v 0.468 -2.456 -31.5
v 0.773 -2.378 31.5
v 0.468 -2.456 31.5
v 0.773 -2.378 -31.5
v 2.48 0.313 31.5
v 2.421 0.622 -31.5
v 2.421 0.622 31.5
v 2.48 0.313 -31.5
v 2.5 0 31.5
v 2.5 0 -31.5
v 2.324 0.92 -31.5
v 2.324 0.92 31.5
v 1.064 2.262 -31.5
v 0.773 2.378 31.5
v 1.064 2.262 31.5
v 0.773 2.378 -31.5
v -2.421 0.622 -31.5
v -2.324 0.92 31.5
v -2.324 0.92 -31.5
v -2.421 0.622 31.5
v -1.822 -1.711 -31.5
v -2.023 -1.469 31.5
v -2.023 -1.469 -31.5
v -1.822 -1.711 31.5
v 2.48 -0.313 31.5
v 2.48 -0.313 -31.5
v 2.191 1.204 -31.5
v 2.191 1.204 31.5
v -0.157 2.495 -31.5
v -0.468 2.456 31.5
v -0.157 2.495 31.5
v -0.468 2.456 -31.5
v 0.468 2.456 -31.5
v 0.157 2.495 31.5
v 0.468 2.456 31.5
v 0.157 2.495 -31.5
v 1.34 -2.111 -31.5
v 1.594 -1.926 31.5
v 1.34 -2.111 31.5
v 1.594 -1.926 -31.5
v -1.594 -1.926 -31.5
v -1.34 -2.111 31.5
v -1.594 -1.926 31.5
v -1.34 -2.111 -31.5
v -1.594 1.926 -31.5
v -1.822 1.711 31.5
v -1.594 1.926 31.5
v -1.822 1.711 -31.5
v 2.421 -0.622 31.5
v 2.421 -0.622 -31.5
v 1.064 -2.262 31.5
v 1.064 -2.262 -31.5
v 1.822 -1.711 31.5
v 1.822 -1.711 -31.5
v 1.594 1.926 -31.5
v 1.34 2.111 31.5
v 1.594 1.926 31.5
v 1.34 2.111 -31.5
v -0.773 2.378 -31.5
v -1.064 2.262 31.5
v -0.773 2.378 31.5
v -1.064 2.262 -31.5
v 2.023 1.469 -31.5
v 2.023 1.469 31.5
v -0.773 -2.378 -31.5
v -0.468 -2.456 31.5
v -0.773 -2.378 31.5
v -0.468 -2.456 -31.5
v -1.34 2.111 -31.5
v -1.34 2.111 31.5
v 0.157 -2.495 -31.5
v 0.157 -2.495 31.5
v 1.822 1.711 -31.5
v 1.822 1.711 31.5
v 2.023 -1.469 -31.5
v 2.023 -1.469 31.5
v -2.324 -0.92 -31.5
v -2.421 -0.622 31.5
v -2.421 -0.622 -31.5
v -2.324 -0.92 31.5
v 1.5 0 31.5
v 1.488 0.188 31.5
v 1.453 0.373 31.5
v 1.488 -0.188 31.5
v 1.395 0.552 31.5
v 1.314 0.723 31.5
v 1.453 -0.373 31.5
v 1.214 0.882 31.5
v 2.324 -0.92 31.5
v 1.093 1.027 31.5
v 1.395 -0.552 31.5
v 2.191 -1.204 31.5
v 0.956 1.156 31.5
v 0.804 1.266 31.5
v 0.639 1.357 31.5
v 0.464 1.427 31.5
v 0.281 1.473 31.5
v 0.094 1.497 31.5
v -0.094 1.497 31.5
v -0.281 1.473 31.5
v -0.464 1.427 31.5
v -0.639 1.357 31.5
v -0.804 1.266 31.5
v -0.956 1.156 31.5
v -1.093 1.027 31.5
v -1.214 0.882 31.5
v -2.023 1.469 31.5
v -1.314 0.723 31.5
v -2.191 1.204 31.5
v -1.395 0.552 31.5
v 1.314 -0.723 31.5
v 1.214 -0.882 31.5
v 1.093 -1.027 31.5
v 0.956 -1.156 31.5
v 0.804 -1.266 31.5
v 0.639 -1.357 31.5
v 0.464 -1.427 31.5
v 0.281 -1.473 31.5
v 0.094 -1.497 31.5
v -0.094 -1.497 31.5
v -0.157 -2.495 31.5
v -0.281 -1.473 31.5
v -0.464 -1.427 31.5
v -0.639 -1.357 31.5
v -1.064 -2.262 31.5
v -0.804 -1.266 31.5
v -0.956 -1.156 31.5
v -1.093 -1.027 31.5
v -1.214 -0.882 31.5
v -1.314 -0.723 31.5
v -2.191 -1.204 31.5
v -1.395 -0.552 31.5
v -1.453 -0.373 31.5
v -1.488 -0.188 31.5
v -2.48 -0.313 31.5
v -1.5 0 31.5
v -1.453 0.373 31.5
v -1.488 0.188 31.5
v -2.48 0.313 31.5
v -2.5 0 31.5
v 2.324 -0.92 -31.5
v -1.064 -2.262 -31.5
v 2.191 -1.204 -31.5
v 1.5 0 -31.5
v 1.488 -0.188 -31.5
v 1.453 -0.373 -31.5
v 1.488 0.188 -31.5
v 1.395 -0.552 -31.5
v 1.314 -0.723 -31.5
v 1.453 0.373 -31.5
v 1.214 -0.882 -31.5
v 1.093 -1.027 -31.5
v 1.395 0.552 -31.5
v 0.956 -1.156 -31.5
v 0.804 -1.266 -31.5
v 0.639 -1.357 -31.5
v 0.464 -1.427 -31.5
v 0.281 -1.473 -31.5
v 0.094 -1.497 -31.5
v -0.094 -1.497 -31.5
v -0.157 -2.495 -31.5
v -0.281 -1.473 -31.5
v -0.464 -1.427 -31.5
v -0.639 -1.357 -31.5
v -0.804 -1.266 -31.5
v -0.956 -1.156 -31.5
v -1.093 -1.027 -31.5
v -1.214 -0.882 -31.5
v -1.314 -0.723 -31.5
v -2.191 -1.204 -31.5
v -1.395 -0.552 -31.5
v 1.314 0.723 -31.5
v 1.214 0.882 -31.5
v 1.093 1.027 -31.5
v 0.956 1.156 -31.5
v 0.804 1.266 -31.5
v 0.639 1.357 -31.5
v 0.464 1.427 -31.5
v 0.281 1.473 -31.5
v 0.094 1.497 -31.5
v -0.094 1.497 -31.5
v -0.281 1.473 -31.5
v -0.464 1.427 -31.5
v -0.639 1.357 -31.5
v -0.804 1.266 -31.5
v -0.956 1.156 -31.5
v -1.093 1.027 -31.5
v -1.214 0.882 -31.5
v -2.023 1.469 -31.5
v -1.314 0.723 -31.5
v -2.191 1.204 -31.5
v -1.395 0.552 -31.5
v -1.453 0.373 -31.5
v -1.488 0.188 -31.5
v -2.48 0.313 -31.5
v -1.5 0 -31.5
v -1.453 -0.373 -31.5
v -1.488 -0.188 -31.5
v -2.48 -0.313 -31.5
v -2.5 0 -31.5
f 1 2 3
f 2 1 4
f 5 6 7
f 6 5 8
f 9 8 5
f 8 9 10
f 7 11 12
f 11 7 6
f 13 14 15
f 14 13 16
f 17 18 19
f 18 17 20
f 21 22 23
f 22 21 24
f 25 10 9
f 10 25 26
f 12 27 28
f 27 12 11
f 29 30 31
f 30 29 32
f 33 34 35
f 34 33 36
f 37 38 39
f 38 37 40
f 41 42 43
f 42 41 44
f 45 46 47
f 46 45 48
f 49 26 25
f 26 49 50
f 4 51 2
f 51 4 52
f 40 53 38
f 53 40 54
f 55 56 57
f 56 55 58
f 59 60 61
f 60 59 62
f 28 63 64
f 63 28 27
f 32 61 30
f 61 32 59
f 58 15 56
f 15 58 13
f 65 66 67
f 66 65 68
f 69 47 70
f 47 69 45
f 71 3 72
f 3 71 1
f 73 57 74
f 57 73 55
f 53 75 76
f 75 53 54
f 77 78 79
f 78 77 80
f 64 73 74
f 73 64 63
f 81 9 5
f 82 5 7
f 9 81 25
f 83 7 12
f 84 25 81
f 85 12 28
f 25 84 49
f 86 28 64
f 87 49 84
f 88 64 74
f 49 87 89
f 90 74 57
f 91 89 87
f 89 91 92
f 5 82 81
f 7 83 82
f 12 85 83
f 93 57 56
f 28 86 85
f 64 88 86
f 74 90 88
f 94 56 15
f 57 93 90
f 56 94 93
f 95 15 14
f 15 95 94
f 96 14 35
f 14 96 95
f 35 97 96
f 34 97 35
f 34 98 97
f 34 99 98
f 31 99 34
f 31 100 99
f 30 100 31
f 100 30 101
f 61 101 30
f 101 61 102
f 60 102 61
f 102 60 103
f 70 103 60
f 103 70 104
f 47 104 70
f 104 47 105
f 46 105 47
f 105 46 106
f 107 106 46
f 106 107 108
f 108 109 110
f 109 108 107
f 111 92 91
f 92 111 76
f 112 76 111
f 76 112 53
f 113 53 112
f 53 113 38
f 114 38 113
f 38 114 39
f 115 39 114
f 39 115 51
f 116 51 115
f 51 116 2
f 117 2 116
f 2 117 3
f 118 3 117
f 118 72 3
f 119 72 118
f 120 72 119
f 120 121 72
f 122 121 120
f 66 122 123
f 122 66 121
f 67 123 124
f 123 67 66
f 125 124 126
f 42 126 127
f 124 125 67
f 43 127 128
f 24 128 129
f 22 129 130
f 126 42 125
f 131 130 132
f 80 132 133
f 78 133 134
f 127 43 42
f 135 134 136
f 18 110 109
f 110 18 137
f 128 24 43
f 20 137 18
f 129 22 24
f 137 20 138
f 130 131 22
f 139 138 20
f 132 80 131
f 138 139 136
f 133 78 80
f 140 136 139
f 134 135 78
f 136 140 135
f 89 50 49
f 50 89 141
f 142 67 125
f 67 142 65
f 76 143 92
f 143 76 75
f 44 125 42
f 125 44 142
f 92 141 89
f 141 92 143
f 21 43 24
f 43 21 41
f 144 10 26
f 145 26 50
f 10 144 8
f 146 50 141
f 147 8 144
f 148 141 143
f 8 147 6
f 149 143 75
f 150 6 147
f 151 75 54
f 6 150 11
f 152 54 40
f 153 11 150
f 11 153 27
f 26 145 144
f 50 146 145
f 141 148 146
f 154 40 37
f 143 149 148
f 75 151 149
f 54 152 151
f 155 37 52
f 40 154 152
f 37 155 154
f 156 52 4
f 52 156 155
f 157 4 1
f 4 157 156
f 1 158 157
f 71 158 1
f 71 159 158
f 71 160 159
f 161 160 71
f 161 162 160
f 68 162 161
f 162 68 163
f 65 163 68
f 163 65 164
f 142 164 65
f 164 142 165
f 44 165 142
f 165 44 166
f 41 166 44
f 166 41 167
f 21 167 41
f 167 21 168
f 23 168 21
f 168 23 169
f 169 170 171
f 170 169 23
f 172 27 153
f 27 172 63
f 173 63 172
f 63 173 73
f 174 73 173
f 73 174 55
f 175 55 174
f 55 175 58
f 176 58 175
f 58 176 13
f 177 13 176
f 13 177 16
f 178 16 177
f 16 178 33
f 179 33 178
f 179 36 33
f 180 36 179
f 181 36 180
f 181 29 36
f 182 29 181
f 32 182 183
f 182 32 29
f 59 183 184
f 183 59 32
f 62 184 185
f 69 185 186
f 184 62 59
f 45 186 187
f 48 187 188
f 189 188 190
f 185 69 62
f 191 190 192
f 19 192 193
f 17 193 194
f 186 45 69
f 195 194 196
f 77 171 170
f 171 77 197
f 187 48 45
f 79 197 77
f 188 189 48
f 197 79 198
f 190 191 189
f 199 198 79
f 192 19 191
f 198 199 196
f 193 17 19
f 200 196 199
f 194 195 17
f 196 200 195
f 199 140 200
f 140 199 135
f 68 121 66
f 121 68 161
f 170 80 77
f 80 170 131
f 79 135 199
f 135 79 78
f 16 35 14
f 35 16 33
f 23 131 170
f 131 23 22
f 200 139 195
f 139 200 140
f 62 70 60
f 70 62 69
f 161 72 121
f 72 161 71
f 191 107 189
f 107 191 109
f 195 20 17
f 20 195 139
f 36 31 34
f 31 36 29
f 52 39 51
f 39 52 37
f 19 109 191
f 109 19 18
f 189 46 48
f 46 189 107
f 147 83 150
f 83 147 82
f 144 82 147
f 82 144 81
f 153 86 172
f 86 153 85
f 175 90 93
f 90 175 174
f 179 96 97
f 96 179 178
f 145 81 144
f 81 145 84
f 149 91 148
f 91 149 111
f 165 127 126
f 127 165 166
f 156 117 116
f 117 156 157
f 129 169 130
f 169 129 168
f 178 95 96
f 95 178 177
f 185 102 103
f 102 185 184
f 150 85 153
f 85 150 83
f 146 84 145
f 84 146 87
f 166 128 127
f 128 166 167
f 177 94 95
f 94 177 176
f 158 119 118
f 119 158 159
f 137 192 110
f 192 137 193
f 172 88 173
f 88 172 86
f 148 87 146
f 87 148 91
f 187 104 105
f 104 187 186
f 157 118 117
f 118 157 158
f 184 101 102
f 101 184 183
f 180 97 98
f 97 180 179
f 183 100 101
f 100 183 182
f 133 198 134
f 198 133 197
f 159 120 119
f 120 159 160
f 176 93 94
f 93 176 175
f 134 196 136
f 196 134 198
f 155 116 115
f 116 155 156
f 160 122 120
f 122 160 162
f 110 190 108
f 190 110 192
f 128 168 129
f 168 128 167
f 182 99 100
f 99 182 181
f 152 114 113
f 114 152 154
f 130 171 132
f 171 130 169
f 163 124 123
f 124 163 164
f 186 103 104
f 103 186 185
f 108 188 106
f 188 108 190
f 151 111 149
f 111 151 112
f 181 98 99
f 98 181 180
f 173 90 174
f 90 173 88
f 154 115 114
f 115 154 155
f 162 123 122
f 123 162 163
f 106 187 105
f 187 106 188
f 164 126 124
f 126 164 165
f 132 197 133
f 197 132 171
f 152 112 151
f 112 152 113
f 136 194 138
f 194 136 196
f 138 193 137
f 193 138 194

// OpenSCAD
$fn = 50;


difference() {
	union() {
		translate(v = [0, 0, -31.5000000000]) {
			cylinder(h = 63, r = 2.5000000000);
		}
	}
	union() {
		translate(v = [0, 0, -100.0000000000]) {
			cylinder(h = 200, r = 1.5000000000);
		}
	}
}
